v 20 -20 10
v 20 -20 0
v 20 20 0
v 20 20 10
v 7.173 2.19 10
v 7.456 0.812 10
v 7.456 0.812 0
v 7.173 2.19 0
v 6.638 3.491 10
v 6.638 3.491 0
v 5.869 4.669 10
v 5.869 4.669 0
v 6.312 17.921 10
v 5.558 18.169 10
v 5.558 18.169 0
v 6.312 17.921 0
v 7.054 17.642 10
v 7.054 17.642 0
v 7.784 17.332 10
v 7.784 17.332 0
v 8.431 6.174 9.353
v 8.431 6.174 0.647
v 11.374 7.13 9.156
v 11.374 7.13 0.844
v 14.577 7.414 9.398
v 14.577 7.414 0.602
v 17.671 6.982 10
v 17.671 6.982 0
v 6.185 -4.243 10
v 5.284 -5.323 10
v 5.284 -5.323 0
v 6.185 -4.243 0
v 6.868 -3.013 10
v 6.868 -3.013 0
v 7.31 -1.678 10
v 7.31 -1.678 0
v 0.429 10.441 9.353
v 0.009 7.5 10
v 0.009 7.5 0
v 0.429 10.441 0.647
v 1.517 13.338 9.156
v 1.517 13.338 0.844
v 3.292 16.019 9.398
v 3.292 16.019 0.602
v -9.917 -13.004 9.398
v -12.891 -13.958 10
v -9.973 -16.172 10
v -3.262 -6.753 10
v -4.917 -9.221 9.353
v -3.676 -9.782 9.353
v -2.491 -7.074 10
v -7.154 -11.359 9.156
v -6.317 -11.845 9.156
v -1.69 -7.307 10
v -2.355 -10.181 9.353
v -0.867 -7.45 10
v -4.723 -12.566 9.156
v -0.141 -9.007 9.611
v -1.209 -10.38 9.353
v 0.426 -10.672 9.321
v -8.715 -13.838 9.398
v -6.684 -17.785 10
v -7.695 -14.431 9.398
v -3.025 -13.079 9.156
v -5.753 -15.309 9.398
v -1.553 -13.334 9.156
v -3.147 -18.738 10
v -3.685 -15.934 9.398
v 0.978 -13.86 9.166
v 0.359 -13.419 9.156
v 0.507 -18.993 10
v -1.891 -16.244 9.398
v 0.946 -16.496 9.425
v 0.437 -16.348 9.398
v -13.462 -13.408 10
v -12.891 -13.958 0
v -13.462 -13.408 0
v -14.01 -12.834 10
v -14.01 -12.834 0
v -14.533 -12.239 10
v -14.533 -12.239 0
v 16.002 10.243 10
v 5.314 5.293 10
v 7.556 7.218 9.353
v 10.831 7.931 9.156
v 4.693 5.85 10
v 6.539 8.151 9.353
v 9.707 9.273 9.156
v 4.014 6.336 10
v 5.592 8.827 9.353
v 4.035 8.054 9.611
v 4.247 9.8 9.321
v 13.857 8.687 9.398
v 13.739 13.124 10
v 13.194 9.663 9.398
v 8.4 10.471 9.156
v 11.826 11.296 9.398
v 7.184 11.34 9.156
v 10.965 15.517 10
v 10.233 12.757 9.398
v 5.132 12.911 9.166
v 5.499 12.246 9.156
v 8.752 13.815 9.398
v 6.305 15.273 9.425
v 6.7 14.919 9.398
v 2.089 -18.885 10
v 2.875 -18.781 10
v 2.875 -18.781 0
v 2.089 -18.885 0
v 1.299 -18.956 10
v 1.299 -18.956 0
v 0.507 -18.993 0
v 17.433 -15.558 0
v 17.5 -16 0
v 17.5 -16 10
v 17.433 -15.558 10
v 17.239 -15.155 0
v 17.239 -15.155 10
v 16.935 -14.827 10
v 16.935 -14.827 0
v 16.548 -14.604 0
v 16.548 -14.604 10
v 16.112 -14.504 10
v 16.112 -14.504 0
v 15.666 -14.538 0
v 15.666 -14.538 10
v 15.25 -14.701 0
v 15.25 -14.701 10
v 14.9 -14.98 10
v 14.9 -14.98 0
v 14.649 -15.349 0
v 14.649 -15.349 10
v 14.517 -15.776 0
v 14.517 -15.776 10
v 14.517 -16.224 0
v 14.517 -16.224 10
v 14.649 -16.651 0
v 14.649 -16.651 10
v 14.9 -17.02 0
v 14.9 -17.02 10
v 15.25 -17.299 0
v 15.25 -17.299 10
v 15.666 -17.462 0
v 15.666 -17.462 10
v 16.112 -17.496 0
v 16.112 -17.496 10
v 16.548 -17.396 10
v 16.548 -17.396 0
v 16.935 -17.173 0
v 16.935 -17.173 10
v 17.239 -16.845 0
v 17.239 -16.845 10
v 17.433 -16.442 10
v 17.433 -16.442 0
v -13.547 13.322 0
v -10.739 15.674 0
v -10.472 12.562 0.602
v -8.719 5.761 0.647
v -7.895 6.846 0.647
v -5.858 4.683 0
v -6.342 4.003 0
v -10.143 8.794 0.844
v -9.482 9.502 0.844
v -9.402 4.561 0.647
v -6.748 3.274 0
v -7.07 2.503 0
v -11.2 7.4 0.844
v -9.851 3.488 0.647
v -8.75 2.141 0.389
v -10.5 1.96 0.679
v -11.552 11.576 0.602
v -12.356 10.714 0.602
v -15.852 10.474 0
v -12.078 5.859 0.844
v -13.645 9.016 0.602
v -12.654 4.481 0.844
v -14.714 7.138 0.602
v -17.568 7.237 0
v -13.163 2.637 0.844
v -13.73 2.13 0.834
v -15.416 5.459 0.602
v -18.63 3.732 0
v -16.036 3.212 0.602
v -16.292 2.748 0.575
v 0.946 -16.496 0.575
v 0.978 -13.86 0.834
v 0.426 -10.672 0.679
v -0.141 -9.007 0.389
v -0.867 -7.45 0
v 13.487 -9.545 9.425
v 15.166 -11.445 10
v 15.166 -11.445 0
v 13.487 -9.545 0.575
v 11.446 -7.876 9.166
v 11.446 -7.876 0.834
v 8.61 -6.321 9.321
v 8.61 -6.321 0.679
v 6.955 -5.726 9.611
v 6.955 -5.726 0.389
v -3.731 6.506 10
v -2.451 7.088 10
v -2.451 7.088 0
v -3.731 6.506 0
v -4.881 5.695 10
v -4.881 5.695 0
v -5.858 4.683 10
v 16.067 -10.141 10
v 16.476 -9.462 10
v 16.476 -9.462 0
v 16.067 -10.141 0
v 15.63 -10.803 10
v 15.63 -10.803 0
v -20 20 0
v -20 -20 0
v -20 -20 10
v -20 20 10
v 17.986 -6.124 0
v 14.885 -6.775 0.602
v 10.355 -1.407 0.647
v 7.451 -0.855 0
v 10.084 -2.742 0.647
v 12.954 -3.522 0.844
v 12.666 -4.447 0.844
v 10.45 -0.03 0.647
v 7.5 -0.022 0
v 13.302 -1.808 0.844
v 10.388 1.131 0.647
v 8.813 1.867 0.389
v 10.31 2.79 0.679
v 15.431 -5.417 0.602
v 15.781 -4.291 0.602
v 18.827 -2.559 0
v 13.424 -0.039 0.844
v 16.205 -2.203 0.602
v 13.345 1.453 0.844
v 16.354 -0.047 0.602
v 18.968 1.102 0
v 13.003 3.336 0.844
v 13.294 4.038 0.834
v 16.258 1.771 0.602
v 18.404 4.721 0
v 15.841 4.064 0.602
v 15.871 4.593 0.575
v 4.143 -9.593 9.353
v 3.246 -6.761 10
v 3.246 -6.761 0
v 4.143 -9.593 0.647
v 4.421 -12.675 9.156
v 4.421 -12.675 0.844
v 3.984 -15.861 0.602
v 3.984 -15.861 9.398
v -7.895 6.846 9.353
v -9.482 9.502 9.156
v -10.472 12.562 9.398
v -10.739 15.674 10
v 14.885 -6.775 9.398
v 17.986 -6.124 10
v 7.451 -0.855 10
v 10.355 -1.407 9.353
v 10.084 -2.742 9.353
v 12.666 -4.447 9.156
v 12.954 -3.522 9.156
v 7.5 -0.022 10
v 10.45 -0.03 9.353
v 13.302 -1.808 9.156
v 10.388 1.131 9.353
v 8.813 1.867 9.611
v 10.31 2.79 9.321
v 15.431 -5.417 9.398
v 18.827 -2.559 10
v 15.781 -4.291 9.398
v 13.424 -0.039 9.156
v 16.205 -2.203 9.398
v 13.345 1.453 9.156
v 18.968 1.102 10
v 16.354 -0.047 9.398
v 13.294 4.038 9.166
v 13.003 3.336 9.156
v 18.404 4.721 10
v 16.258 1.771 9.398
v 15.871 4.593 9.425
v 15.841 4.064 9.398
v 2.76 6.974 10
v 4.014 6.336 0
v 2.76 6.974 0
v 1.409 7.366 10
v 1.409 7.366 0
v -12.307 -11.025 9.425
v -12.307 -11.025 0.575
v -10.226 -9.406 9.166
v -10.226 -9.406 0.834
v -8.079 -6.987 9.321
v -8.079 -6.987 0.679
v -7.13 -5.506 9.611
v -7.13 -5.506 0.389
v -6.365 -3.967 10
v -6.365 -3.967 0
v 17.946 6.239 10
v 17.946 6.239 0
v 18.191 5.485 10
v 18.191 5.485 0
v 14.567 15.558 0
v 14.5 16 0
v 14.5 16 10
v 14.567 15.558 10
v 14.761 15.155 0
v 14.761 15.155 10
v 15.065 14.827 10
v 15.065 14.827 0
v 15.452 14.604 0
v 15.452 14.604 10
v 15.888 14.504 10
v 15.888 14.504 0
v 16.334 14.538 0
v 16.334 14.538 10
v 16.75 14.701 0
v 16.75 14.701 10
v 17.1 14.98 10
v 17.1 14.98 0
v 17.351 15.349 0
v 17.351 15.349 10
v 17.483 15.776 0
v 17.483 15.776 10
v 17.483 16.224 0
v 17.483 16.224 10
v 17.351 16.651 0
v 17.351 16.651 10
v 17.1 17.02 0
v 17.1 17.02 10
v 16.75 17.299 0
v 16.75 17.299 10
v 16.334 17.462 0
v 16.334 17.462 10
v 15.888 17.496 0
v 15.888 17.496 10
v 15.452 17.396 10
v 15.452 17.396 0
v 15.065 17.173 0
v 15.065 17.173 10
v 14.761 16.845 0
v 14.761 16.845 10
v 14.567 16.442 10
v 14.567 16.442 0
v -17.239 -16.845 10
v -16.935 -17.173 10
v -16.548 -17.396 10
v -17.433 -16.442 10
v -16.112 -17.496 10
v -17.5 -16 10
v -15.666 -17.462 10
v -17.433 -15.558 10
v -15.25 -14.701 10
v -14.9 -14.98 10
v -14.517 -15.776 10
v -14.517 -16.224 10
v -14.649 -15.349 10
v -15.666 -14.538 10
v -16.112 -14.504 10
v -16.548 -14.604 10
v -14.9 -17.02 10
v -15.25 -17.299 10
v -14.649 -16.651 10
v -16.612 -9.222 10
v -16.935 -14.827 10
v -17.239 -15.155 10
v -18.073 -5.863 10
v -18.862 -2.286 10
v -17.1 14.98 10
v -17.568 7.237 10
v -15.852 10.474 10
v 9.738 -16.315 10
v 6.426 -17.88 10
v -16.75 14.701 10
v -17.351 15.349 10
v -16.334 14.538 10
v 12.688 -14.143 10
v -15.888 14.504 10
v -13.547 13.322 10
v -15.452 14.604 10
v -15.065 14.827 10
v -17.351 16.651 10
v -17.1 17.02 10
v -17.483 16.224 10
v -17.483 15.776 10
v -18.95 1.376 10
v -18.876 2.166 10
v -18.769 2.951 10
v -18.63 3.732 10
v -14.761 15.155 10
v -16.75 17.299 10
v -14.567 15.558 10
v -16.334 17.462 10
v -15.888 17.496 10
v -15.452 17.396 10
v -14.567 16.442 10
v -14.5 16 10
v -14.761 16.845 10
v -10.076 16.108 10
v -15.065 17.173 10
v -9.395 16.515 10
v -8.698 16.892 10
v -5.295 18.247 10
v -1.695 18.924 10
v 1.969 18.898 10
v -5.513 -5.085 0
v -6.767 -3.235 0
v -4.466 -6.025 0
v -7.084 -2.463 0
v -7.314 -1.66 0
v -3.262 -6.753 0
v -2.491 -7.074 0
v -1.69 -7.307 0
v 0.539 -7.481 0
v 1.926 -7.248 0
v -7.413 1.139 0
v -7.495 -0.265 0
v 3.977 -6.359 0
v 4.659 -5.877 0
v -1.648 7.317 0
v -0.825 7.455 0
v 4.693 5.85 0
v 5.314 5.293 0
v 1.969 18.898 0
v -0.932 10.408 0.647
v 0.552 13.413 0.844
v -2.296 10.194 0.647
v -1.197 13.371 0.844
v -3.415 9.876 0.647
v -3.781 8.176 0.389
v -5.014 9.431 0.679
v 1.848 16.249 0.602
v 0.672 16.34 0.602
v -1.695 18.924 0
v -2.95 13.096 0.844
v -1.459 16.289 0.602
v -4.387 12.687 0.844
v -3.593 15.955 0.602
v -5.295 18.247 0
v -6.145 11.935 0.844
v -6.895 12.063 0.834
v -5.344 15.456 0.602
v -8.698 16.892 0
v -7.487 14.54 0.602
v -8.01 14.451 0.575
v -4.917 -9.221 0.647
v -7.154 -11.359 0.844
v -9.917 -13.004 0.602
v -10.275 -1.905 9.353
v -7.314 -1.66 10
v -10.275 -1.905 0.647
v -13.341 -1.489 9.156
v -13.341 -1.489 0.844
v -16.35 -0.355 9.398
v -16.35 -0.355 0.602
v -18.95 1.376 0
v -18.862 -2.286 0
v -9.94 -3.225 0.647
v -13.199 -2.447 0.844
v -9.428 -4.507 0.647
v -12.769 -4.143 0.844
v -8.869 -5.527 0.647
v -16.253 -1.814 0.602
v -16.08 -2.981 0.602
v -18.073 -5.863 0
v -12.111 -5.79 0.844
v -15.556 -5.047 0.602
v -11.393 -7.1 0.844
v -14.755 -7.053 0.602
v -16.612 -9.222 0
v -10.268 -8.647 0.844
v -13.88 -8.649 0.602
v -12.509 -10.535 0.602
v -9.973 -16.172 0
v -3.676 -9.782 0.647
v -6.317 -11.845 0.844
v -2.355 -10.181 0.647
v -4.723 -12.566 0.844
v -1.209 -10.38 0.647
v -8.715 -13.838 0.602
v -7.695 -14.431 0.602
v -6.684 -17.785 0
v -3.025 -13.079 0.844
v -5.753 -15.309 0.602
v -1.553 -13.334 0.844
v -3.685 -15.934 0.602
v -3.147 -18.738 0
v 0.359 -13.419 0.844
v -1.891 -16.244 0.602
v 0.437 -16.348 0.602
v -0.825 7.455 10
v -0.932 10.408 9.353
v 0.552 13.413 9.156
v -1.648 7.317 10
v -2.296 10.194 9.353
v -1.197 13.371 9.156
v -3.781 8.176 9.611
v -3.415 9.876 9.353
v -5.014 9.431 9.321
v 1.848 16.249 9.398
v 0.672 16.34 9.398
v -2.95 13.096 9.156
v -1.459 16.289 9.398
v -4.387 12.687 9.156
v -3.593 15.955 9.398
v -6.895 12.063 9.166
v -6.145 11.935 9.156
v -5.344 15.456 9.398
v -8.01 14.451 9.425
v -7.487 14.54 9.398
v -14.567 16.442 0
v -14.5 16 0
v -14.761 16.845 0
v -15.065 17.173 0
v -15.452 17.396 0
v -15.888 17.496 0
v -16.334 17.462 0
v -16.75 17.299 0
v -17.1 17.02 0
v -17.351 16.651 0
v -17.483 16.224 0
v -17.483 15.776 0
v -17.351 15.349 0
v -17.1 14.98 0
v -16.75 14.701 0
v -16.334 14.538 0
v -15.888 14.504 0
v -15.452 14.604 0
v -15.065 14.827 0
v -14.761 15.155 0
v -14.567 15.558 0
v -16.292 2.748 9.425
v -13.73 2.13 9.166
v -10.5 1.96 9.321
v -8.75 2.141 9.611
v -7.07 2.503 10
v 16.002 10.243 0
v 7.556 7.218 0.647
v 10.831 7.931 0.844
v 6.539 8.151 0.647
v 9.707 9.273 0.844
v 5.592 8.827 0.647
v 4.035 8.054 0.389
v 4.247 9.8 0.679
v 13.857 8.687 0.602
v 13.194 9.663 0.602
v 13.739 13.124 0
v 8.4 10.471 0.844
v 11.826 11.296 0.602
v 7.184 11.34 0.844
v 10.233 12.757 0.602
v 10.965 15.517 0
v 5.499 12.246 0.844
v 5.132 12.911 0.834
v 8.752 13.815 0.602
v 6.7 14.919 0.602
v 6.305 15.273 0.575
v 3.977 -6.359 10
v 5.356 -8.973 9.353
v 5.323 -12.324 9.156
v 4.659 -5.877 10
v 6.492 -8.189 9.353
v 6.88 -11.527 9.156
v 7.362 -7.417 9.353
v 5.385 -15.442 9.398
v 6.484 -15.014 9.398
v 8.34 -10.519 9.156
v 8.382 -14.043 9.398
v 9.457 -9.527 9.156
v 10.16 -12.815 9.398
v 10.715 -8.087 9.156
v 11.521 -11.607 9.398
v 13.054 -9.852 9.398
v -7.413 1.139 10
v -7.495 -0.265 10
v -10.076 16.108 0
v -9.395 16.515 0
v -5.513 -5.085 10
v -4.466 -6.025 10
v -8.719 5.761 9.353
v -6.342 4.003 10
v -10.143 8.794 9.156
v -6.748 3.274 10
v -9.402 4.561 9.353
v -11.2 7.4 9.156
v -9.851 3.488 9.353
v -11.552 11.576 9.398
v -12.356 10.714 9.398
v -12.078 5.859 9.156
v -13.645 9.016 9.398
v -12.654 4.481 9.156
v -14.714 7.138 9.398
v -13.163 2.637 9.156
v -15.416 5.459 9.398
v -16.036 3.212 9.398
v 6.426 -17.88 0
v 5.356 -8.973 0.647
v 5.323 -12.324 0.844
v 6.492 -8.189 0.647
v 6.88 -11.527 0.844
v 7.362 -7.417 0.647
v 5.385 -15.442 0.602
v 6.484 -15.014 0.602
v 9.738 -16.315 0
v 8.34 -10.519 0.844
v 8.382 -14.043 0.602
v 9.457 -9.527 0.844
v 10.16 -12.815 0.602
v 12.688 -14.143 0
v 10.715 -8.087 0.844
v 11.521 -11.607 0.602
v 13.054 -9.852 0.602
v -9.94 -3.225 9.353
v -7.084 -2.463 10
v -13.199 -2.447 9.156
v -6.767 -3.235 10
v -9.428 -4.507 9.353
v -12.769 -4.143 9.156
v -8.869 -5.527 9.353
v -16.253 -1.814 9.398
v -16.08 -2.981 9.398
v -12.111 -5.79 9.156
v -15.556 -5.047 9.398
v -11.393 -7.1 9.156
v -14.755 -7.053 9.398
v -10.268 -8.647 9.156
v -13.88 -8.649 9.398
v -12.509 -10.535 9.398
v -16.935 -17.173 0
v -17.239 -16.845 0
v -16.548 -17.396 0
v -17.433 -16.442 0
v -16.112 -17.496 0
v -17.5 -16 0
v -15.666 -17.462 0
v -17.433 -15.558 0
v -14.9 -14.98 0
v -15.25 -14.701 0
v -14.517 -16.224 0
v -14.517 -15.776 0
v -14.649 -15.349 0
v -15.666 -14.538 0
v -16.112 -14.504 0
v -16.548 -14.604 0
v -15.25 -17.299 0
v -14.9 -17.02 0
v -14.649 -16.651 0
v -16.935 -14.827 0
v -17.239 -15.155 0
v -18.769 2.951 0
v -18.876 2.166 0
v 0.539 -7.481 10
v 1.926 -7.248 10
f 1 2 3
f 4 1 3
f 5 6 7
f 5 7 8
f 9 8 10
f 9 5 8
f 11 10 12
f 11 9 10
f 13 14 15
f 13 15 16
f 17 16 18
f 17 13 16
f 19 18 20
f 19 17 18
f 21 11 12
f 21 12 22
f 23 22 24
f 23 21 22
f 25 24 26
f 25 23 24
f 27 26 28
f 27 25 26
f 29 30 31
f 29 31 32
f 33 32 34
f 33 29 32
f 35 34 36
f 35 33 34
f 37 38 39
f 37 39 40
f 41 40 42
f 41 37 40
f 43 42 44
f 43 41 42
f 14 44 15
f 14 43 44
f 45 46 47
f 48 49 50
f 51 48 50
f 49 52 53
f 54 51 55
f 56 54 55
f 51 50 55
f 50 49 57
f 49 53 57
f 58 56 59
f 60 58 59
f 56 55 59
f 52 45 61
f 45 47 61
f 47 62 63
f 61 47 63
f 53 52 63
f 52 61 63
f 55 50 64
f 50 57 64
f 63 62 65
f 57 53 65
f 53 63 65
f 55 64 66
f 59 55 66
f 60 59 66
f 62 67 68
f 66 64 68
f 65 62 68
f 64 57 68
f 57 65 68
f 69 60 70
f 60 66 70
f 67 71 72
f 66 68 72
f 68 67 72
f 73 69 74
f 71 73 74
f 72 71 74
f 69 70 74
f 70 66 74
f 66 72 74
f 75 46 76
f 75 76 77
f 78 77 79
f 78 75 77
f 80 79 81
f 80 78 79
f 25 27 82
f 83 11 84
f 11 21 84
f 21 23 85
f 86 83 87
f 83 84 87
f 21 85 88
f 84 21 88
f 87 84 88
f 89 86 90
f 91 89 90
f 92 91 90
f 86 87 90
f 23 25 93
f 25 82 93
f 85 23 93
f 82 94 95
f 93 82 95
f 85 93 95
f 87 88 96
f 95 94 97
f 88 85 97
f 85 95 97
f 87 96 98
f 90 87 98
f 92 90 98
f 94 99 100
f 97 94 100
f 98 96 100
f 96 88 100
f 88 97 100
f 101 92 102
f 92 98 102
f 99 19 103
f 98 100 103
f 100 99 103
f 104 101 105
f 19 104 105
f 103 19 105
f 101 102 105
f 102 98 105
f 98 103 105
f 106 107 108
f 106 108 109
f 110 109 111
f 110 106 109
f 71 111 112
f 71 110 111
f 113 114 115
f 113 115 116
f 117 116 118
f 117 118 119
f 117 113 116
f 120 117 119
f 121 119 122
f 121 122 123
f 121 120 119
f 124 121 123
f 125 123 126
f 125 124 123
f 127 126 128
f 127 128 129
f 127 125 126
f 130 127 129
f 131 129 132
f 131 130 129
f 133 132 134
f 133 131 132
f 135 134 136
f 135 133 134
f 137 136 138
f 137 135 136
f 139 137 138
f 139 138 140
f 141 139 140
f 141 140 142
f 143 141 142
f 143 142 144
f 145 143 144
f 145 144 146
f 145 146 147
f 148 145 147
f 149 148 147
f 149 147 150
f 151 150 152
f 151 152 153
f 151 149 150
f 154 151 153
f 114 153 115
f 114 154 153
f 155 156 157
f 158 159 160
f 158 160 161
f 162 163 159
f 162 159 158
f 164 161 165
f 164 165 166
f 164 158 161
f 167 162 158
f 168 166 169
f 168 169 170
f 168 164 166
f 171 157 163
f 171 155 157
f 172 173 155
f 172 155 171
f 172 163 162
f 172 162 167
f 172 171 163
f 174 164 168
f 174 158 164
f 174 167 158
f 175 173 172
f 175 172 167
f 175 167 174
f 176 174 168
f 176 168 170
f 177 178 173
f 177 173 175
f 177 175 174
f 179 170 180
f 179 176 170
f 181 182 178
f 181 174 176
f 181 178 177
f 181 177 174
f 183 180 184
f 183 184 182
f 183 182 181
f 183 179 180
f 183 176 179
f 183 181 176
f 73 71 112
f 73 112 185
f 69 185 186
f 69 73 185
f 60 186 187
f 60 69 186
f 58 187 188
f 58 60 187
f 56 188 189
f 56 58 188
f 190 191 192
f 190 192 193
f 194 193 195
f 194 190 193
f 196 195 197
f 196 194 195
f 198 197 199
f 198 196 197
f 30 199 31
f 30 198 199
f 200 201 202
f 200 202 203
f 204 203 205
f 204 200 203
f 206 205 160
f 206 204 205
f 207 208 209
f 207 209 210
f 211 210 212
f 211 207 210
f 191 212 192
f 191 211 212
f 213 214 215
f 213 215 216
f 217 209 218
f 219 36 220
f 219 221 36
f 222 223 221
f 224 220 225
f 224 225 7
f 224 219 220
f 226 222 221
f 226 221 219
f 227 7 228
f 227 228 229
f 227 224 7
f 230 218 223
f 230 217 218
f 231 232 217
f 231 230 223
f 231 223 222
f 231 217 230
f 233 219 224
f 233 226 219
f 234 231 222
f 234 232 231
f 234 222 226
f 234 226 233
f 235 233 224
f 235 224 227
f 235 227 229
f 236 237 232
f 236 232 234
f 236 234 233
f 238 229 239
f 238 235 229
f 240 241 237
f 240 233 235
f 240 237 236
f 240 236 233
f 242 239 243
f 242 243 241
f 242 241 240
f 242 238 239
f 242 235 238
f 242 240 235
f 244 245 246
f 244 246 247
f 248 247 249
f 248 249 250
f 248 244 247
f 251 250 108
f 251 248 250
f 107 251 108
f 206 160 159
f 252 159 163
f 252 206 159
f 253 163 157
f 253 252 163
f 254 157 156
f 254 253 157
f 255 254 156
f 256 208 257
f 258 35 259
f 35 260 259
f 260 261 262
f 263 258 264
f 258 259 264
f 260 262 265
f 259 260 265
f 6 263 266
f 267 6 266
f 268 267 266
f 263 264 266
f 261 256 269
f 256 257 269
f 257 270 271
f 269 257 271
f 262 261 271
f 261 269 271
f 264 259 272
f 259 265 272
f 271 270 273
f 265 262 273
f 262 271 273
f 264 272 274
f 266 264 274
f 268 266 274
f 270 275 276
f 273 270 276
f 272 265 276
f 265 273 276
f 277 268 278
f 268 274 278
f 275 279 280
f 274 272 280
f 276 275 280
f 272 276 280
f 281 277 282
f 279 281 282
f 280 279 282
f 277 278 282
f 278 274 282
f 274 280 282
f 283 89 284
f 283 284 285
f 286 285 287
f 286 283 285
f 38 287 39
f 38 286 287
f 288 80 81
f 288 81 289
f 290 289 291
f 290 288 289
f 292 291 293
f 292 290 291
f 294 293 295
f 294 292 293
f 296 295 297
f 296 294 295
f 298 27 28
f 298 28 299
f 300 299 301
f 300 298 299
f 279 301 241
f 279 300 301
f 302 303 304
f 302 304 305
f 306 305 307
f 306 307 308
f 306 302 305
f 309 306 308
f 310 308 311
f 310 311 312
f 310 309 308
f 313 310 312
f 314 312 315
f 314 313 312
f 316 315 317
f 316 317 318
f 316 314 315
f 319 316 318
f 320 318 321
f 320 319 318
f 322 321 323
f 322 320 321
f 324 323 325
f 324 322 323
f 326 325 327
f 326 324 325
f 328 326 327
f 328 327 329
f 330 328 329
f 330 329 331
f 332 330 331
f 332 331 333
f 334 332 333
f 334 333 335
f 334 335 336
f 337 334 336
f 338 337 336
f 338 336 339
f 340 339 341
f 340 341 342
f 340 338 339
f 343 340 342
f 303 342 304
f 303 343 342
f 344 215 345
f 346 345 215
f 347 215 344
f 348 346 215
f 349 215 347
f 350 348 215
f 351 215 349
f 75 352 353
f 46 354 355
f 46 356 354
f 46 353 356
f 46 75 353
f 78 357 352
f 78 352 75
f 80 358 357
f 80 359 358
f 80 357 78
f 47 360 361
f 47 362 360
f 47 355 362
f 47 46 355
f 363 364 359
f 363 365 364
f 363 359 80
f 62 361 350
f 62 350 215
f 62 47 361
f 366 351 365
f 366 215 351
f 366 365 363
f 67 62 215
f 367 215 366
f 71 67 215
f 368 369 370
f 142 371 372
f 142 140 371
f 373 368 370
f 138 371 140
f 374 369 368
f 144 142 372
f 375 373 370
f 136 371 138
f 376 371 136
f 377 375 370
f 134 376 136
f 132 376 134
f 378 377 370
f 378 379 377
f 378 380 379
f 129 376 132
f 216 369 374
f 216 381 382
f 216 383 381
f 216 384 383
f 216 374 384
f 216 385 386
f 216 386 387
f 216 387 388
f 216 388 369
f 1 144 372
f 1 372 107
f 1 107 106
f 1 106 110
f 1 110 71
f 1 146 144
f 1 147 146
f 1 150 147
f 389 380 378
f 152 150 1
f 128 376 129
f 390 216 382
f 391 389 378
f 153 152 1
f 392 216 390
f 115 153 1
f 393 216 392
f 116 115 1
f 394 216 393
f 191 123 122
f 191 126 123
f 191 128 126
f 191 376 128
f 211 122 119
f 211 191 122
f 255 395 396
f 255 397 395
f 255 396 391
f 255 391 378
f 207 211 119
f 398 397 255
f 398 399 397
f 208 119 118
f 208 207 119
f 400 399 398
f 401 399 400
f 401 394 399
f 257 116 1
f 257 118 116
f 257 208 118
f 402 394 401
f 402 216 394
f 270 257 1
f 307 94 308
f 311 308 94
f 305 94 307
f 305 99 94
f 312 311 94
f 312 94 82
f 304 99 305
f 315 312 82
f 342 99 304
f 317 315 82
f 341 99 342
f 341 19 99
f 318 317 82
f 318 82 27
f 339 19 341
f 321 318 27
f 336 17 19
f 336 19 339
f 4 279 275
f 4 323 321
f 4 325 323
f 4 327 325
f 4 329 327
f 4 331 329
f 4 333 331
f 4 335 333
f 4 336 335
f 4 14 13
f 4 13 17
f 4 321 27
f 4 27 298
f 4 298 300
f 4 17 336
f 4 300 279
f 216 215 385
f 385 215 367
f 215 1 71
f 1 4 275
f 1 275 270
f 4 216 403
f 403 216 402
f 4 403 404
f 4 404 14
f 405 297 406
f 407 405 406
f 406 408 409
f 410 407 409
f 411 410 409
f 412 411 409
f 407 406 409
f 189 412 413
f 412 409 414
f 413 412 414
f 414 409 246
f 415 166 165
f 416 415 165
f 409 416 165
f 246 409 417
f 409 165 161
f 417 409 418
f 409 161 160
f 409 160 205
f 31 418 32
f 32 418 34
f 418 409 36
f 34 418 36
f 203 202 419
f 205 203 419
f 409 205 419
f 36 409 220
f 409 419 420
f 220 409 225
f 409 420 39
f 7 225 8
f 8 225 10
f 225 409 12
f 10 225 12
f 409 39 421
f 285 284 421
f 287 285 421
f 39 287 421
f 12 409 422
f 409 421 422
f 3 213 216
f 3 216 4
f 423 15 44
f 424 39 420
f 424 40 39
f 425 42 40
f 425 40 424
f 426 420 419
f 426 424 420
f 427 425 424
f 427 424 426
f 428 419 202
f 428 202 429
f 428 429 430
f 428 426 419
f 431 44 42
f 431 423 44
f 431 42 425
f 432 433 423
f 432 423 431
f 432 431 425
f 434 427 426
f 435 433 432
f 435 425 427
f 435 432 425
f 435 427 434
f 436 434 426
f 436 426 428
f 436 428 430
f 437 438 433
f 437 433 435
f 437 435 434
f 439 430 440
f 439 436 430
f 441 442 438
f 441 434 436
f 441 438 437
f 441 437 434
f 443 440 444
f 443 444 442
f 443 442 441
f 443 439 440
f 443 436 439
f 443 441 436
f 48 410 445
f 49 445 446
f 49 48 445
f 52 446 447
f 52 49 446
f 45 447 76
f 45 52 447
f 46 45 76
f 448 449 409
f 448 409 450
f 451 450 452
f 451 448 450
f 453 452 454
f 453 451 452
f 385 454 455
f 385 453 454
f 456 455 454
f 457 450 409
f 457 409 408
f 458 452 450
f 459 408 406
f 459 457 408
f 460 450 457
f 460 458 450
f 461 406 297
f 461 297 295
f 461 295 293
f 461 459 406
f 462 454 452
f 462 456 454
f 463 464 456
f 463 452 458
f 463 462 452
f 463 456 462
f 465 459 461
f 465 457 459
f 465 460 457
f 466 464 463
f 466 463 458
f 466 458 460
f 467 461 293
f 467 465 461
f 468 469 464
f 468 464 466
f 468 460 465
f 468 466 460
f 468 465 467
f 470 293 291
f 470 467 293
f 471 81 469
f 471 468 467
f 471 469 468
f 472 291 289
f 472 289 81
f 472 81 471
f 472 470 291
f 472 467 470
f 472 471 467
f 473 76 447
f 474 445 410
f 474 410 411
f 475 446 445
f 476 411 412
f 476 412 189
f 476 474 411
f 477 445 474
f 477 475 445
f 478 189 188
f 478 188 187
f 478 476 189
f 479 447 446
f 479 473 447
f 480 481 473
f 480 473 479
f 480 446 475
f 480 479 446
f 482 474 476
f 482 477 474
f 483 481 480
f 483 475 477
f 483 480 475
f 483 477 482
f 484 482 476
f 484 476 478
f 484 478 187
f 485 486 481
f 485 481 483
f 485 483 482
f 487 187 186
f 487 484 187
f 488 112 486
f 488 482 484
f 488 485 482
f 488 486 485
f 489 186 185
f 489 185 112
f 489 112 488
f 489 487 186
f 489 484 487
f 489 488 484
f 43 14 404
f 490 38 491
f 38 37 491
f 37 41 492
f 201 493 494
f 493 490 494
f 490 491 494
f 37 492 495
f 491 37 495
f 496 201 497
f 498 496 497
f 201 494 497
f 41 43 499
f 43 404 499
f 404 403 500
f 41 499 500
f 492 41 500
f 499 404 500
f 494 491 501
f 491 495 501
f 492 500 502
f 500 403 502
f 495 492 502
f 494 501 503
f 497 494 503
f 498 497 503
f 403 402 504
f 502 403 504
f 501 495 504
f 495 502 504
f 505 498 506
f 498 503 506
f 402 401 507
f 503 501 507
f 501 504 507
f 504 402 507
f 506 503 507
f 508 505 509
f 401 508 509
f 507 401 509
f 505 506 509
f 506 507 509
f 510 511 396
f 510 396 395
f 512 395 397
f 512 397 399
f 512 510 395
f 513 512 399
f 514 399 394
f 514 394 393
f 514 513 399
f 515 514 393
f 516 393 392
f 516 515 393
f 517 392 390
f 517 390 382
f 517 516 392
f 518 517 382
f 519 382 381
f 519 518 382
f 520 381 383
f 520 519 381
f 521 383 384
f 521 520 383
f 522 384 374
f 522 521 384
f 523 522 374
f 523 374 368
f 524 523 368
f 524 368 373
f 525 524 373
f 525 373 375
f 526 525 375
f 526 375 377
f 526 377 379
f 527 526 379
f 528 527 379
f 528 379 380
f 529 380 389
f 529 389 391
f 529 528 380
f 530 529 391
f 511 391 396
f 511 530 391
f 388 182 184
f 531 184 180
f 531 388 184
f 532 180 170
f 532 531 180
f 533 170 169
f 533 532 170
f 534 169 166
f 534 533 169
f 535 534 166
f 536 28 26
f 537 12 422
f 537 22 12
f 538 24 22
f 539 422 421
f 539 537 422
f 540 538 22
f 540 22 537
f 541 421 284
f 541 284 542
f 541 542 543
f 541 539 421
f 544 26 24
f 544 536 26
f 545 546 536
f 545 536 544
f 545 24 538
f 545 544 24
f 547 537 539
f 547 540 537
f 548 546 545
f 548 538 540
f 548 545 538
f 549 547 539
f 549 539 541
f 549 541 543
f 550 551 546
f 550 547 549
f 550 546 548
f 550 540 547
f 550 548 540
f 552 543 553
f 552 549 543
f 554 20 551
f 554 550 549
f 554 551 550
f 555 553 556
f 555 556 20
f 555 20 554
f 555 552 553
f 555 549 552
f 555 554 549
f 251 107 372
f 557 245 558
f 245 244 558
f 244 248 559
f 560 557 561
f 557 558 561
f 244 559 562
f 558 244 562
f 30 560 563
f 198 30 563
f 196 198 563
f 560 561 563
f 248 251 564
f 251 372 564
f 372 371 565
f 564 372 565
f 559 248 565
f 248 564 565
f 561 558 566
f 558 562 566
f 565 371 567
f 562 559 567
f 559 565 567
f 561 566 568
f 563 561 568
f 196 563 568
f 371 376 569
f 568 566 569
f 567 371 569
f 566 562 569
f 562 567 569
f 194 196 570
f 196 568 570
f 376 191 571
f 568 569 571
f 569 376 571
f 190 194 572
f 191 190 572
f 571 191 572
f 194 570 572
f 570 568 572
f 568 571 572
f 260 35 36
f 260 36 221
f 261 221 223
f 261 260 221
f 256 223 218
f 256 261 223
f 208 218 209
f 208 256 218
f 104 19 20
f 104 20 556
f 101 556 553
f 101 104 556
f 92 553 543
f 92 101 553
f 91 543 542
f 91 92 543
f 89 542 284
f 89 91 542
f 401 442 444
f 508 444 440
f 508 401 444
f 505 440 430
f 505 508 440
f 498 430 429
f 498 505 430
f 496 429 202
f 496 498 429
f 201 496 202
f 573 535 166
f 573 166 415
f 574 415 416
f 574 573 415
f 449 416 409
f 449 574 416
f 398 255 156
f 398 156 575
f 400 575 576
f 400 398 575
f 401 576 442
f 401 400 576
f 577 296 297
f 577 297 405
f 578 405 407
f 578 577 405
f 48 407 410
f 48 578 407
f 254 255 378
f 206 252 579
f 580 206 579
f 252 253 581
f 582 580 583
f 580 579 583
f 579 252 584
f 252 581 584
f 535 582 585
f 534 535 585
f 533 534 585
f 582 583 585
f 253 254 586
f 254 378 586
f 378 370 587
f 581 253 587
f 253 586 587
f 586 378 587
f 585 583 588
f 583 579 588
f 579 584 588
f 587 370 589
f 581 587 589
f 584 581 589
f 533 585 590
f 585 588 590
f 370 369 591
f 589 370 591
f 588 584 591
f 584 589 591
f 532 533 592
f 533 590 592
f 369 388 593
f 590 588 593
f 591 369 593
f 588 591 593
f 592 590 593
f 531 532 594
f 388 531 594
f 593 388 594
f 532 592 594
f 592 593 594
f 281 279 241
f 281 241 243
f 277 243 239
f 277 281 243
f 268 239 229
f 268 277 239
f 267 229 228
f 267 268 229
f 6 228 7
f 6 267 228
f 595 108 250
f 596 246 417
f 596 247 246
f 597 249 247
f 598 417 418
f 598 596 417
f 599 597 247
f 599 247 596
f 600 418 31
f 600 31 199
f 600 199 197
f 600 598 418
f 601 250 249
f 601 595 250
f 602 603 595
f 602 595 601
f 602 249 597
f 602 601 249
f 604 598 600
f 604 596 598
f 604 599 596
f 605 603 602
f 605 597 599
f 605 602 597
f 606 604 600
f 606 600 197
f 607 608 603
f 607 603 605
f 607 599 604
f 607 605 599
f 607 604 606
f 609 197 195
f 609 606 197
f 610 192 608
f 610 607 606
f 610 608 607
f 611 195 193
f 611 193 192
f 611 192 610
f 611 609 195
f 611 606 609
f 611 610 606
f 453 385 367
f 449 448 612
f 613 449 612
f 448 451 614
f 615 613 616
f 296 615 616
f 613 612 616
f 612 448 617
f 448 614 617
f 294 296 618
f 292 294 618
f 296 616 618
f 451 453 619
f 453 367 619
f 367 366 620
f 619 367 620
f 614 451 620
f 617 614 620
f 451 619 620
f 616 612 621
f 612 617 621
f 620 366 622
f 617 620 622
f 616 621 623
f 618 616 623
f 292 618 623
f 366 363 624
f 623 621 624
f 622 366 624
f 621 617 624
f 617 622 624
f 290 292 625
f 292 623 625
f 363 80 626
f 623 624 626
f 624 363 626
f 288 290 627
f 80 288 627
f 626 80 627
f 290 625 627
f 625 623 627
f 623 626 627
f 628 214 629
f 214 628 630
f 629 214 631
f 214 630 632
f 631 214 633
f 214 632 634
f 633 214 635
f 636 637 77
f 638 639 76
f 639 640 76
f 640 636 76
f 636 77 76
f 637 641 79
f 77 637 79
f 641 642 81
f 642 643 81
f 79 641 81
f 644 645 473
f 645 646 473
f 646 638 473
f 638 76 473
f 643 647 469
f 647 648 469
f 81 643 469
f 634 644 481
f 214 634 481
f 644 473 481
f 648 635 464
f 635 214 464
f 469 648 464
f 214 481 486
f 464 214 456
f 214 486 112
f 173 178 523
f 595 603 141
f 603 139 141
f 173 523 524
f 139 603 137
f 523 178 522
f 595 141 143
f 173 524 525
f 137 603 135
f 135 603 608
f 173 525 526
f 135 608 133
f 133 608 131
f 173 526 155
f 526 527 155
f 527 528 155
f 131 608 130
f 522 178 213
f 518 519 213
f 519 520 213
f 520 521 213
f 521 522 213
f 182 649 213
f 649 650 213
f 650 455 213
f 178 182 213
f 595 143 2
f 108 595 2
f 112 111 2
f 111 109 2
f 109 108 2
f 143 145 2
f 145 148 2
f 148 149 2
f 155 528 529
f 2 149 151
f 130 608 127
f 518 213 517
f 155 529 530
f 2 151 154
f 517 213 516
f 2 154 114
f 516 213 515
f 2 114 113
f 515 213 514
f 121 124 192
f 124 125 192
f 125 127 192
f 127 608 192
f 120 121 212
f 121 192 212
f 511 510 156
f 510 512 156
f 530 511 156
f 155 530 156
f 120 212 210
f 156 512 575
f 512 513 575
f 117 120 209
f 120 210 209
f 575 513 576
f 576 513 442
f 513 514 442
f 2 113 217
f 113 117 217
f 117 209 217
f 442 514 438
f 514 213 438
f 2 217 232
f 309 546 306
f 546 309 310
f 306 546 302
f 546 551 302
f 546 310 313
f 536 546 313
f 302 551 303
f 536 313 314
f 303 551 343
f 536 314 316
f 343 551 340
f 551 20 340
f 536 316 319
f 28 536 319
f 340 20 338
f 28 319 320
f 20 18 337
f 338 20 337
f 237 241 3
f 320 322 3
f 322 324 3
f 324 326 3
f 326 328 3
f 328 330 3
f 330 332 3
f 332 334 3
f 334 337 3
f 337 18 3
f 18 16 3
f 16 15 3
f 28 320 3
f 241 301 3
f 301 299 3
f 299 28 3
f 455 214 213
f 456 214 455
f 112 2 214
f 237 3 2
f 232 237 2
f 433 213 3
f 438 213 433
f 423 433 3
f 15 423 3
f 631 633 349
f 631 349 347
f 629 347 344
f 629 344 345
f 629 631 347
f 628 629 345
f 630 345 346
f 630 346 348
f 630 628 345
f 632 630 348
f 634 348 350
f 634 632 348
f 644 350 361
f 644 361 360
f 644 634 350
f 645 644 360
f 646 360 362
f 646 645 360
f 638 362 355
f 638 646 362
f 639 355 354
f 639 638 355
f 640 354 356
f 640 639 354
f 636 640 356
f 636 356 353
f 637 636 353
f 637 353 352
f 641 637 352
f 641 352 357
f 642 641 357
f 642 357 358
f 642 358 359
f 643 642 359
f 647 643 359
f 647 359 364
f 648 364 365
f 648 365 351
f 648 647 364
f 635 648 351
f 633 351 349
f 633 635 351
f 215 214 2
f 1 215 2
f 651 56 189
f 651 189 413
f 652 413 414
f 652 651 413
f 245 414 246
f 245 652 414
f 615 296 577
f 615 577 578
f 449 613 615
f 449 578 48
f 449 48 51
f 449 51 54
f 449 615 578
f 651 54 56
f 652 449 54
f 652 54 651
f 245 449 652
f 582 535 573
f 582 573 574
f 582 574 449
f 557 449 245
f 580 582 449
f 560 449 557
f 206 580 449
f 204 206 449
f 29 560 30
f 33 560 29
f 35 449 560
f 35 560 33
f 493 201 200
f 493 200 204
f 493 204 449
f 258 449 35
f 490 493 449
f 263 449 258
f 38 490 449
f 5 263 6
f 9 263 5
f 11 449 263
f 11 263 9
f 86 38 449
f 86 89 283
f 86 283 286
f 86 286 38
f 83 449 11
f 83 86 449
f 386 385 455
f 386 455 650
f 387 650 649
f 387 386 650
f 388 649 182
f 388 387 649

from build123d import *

# Parameters (mm, degrees)
ESQUISSE1_W                  = 40
ESQUISSE1_H                  = 40
ESQUISSE1_R                  = 1.5
BOSS_EXTRU_1_DEPTH           = 10
ENL_V_MAT_EXTRU_1_DEPTH      = 31
R_P_TITION_CIRCULAIRE1_COUNT = 7


with BuildPart() as part:
    # Esquisse1 → Boss.-Extru.1 (new body)
    with BuildSketch(Plane.XY):
        Rectangle(ESQUISSE1_W, ESQUISSE1_H)
        with Locations((-16, 16)):
            Circle(ESQUISSE1_R, mode=Mode.SUBTRACT)
        with Locations(Location((16, 16, 0), (0, 0, 180))):
            Circle(ESQUISSE1_R, mode=Mode.SUBTRACT)
        with Locations((16, -16)):
            Circle(ESQUISSE1_R, mode=Mode.SUBTRACT)
        with Locations(Location((-16, -16, 0), (0, 0, 180))):
            Circle(ESQUISSE1_R, mode=Mode.SUBTRACT)
    extrude(amount=BOSS_EXTRU_1_DEPTH)

    # Esquisse2 → Enlèv. mat.-Extru.1 (cut, through all)
    with BuildSketch(Plane.XY.offset(10)):
        with BuildLine():
            ThreePointArc((4.013801979, 6.335565774), (2.093936315, 7.201765805), (0.00893123, 7.499994682))
            ThreePointArc((0.00893123, 7.499994682), (1.579824901, 13.460592117), (5.558485397, 18.168743492))
            ThreePointArc((5.558485397, 18.168743492), (6.684148303, 17.785448026), (7.783629485, 17.332487186))
            ThreePointArc((7.783629485, 17.332487186), (4.864634522, 12.188517309), (4.013801979, 6.335565774))
        make_face()
    enl_v_mat_extru_1 = extrude(amount=-ENL_V_MAT_EXTRU_1_DEPTH, mode=Mode.SUBTRACT)

    # Répétition circulaire1: Enlèv. mat.-Extru.1 ×7 about axis
    r_p_tition_circulaire1_axis = Axis((0, 0, 0), (0, 0, 1))
    for i in range(1, R_P_TITION_CIRCULAIRE1_COUNT):
        add(enl_v_mat_extru_1.rotate(r_p_tition_circulaire1_axis, i * 360 / R_P_TITION_CIRCULAIRE1_COUNT), mode=Mode.SUBTRACT)

    # Esquisse3 → Enlèvement de matière-Révolution1 (revolve, cut)
    with BuildSketch(Plane(origin=(0, 0, 0), x_dir=(0, 0, -1), z_dir=(1, 0, 0))):
        with BuildLine():
            Line((0, 19), (0, 7.5))
            ThreePointArc((0, 7.5), (-0.844387246, 13.25), (0, 19))
        make_face()
        with BuildLine():
            Line((-10, 19), (-10, 7.5))
            ThreePointArc((-10, 7.5), (-9.155612754, 13.25), (-10, 19))
        make_face()
    revolve(axis=Axis((0, 0, -0.5), (0, 0, 1)), mode=Mode.SUBTRACT)


solid = part.part
